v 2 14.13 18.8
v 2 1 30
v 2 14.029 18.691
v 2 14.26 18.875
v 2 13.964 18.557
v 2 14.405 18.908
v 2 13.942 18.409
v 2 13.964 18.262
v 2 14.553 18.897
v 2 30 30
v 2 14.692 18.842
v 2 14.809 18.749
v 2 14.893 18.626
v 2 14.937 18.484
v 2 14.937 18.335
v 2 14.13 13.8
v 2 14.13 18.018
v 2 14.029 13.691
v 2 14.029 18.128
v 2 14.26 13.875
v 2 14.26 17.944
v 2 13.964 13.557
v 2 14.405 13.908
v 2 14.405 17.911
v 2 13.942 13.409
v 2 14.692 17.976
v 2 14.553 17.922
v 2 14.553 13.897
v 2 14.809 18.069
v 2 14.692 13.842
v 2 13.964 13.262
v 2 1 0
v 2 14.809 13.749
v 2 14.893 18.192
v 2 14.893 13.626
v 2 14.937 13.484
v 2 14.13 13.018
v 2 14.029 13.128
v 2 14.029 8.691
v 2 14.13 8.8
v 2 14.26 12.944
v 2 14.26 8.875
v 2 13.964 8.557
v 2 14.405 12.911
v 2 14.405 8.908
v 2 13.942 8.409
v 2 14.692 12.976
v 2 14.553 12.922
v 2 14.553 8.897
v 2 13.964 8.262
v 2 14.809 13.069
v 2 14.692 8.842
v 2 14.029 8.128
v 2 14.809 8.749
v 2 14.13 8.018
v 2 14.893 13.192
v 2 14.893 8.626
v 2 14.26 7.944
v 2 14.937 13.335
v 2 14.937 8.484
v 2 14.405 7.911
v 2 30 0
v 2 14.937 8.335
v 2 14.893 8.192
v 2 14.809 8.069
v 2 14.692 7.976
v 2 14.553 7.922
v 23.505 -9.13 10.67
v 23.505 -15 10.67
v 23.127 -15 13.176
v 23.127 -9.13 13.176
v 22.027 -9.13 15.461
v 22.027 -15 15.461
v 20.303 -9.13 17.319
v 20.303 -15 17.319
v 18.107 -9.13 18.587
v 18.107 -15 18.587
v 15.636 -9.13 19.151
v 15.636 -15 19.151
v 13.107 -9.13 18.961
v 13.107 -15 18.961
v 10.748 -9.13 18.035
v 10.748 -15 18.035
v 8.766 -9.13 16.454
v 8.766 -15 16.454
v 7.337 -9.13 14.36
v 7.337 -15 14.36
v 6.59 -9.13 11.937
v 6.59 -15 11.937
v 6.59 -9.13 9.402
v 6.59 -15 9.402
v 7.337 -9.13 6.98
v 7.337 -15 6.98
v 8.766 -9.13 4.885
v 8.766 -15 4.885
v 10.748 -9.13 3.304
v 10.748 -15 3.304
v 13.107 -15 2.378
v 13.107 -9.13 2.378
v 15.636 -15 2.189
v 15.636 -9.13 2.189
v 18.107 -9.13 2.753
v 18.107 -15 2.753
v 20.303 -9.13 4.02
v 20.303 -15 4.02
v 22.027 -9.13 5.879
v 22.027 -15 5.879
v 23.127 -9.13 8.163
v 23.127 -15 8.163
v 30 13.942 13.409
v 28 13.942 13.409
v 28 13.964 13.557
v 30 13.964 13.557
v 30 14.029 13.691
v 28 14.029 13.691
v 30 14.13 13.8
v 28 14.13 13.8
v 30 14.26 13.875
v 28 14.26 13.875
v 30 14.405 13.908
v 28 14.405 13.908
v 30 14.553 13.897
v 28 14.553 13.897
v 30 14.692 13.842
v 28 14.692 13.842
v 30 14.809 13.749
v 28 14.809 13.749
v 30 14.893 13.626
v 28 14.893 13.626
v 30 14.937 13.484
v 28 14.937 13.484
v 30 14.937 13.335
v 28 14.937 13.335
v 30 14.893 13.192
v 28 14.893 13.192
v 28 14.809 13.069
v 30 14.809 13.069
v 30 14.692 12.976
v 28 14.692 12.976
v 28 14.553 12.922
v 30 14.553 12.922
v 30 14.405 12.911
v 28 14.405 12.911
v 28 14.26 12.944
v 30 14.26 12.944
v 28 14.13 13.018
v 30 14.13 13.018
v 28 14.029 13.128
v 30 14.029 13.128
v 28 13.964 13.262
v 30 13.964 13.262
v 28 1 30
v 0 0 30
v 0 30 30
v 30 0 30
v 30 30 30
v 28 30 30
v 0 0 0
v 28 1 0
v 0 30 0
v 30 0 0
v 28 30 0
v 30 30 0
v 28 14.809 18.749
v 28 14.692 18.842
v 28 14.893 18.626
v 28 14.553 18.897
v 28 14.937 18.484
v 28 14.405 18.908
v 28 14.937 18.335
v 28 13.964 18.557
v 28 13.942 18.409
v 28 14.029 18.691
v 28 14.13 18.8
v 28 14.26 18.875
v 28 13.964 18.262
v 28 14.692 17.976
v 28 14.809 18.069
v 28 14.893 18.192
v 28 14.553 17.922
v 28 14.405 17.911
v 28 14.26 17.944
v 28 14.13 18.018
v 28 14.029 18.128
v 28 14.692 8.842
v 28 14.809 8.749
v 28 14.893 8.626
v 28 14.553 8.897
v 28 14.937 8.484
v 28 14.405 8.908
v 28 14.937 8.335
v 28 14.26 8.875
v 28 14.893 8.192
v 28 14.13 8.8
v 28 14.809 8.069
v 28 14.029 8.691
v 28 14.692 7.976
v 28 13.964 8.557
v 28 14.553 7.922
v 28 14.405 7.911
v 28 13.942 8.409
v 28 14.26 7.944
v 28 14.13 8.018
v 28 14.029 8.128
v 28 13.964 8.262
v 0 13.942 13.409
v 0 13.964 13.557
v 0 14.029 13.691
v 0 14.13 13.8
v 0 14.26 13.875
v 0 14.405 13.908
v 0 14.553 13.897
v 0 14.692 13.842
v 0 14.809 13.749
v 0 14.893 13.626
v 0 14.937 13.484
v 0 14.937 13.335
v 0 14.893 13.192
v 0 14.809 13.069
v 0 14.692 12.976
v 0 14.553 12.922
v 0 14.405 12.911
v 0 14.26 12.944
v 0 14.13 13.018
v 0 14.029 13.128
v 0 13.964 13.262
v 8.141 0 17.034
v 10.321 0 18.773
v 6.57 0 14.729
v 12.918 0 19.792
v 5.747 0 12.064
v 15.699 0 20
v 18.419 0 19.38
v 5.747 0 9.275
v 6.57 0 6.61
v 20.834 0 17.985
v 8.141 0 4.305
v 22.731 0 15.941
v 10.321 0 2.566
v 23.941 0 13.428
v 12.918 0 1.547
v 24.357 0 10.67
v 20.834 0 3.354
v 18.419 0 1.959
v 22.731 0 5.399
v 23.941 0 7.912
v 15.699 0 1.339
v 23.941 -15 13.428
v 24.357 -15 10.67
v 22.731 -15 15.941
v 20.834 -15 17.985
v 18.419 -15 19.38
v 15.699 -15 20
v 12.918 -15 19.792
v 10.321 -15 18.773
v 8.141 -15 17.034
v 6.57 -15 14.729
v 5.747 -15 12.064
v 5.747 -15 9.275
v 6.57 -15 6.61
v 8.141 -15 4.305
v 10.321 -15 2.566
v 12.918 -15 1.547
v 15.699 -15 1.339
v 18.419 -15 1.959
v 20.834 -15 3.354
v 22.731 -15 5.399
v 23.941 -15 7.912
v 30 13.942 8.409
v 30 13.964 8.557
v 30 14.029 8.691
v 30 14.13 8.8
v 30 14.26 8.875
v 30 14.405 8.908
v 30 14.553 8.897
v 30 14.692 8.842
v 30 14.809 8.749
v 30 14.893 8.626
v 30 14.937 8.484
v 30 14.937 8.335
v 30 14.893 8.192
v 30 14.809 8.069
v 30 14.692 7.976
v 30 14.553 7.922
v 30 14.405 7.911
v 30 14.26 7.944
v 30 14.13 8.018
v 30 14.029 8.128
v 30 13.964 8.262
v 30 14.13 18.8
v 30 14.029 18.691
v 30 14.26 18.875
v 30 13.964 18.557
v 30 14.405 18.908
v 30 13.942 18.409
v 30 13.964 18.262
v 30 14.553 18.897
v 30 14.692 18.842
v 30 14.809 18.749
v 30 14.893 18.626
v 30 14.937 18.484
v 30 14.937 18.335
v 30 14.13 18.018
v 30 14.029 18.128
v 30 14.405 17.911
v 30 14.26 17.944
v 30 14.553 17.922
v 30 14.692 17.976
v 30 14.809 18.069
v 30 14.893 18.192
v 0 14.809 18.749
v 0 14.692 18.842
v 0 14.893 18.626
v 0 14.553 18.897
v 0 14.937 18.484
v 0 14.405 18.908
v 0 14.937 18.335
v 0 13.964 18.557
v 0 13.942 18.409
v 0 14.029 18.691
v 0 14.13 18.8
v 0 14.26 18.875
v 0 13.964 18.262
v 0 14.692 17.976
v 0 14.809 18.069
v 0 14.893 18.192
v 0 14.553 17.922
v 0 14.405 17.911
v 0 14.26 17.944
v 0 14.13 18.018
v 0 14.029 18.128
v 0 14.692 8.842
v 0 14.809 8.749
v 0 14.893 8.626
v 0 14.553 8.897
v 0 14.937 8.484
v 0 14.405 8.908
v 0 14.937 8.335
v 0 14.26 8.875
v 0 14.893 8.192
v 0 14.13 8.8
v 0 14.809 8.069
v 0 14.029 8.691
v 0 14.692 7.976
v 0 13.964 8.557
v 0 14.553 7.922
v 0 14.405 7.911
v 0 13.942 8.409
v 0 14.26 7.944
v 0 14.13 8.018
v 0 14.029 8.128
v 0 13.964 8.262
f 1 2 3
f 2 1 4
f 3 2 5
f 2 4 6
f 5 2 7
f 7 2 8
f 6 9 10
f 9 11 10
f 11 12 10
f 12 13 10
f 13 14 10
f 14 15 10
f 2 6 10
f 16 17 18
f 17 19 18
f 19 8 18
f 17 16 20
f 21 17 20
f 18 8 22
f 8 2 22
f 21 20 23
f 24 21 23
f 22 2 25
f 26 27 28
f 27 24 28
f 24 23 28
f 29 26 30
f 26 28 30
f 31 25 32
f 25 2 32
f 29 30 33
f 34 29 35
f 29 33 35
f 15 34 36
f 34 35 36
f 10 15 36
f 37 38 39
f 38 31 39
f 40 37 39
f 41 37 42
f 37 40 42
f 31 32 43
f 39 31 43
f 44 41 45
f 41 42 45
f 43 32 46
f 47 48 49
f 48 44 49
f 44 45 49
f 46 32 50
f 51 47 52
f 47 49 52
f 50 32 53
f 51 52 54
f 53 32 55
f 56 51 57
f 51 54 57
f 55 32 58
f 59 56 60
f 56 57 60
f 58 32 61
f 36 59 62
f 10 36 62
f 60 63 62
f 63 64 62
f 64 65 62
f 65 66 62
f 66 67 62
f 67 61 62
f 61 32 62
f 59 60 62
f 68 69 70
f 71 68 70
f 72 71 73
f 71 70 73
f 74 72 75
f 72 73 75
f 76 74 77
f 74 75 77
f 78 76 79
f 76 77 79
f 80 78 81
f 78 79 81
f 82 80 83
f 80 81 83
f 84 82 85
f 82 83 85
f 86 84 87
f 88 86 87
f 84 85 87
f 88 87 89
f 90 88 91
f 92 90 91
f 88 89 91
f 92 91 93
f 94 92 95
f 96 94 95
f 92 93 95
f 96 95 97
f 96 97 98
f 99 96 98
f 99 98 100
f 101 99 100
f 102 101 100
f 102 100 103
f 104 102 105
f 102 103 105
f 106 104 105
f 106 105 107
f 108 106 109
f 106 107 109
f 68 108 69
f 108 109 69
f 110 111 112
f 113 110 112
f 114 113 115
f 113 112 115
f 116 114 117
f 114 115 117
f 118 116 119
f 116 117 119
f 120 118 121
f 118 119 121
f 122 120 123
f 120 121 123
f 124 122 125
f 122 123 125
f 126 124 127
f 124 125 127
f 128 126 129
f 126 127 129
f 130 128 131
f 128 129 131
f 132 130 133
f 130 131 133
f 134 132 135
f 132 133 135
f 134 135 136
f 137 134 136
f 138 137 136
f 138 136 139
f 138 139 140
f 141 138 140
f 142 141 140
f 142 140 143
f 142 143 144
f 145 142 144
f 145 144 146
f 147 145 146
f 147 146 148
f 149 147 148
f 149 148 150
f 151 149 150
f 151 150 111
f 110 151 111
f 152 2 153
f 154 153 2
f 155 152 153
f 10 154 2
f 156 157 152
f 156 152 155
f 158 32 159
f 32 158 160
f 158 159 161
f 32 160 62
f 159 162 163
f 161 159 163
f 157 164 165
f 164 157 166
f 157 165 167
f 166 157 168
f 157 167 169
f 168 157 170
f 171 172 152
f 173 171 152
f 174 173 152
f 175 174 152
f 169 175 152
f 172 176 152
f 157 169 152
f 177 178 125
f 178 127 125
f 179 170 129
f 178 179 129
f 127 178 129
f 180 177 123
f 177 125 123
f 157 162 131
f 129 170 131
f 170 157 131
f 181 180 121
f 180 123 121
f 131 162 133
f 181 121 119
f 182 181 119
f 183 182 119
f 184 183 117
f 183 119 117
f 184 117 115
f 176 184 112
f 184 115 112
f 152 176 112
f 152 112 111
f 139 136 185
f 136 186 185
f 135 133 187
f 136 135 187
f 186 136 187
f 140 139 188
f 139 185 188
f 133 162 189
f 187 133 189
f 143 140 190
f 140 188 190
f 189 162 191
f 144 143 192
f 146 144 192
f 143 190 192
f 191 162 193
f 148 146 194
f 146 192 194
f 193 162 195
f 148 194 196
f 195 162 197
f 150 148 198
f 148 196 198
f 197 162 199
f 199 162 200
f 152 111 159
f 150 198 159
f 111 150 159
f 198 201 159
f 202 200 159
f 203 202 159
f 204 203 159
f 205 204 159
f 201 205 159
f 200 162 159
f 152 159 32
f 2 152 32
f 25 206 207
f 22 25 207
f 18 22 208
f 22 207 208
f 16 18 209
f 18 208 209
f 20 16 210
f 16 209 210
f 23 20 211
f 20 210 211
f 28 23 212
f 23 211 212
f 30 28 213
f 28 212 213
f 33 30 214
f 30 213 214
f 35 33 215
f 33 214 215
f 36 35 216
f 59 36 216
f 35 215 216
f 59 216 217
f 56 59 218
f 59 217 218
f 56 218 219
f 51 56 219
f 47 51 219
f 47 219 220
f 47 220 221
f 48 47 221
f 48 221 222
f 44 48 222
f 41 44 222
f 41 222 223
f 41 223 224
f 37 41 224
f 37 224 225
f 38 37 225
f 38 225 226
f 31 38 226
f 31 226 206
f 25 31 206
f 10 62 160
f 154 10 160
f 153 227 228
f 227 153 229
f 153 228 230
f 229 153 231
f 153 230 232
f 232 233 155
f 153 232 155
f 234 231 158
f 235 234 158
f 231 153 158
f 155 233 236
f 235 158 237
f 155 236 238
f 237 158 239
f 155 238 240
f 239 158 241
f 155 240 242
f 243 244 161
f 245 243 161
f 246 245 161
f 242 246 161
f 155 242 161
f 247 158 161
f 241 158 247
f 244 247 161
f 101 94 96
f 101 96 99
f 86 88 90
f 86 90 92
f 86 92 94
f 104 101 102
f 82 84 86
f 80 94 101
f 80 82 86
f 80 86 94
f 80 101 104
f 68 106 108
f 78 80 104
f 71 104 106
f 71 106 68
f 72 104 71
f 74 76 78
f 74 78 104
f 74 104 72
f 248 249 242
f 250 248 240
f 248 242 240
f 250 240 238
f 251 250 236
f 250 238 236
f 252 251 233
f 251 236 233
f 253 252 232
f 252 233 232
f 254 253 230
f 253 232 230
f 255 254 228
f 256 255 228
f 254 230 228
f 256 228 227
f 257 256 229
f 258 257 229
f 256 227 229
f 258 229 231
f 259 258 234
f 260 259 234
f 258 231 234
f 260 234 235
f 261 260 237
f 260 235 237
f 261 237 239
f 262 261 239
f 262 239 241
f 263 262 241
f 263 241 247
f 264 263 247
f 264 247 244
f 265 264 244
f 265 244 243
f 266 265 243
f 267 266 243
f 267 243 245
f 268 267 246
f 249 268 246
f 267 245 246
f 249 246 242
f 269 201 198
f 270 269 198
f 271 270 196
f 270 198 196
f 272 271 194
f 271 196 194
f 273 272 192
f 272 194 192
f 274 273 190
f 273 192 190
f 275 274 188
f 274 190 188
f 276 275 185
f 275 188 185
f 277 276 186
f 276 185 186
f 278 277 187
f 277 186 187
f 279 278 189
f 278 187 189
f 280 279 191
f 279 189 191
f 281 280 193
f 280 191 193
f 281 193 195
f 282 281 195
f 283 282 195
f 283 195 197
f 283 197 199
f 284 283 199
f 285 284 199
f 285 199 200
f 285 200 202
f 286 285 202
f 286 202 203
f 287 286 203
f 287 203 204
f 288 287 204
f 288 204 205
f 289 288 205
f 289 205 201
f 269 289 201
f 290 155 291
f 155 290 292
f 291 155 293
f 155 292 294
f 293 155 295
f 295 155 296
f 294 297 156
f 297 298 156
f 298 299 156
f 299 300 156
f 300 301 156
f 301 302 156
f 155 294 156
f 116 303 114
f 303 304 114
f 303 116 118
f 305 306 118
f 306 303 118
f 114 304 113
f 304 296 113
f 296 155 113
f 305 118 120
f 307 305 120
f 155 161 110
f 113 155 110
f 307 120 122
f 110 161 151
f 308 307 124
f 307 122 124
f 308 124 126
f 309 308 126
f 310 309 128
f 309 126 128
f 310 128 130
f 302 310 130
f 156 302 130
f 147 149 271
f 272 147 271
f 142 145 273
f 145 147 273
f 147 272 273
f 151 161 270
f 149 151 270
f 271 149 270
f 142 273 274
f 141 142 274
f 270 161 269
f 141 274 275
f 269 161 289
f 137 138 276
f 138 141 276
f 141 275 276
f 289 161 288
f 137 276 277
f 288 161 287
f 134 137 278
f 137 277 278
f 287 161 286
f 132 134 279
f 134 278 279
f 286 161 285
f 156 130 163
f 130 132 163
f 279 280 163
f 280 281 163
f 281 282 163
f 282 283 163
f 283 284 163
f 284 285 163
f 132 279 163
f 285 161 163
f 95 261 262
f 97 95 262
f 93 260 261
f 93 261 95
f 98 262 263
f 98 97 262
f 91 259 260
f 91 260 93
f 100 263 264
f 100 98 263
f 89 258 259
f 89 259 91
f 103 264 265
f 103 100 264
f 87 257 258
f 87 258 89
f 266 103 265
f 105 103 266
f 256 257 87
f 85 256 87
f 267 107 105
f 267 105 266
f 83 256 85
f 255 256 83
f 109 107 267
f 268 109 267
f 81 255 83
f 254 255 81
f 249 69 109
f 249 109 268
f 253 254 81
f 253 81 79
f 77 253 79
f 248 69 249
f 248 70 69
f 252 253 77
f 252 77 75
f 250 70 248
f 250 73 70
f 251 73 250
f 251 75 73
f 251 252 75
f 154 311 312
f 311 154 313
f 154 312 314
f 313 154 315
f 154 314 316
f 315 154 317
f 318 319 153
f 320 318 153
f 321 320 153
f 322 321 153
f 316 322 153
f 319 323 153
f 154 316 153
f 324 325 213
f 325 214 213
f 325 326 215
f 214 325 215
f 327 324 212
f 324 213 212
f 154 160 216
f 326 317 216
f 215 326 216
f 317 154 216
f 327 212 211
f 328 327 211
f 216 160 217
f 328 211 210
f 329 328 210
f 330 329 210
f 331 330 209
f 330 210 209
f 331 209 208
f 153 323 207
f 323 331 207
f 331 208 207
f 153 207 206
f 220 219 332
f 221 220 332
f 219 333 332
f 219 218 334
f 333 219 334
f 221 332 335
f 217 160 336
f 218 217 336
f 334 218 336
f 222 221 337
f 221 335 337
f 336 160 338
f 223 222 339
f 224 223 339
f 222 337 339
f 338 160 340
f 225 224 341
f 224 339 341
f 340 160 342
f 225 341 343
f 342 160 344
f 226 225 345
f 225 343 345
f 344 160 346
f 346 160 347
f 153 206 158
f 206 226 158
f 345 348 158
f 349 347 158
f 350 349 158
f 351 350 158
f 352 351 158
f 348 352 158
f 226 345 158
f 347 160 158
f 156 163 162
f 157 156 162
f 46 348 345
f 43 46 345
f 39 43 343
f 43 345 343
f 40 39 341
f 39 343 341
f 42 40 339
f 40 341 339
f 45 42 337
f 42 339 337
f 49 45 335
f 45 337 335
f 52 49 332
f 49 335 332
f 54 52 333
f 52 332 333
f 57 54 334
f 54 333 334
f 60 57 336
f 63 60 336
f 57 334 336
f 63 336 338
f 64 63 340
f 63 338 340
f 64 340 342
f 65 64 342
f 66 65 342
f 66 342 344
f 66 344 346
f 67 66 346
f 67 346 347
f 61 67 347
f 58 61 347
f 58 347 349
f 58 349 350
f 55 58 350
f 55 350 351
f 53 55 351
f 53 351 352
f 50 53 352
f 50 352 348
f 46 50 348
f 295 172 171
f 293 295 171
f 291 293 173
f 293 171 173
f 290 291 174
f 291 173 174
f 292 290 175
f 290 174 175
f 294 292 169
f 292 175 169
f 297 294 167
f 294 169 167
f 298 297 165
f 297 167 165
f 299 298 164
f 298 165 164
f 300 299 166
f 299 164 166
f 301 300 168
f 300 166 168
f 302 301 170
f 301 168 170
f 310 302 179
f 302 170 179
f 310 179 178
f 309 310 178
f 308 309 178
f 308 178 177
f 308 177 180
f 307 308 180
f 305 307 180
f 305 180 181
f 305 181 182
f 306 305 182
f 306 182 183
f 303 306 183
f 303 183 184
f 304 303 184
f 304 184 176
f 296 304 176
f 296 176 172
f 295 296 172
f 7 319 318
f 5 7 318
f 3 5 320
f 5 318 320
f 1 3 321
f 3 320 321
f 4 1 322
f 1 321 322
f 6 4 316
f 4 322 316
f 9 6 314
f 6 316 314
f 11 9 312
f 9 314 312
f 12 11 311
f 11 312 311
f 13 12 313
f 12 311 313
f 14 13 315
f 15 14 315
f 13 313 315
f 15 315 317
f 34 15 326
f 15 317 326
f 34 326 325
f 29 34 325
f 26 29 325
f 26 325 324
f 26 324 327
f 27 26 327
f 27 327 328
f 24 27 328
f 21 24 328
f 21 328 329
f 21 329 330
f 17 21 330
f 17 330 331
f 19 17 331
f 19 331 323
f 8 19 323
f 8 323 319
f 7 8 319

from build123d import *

# Parameters (mm, degrees)
BOSS_EXTRUDE2_DEPTH = 30
SKETCH2_R           = 9.357027653
BOSS_EXTRUDE3_DEPTH = 15
SKETCH3_R           = 8.504853576
CUT_EXTRUDE1_DEPTH  = 5.87
SKETCH4_R           = 0.5
CUT_EXTRUDE2_DEPTH  = 37.592


with BuildPart() as part:
    # Sketch1 → Boss-Extrude2 (new body)
    with BuildSketch(Plane.XY):
        Polygon((0, 30), (0, 0), (30, 0), (30, 30), (28, 30), (28, 1), (1.999996, 1), (1.999996, 30), align=None)
    extrude(amount=BOSS_EXTRUDE2_DEPTH)

    # Sketch2 → Boss-Extrude3 (add)
    with BuildSketch(Plane.XZ):
        with Locations((15, 10.669629744)):
            Circle(SKETCH2_R)
    extrude(amount=BOSS_EXTRUDE3_DEPTH)

    # Sketch3 → Cut-Extrude1 (cut)
    with BuildSketch(Plane.XZ.offset(15)):
        with Locations((15, 10.669629744)):
            Circle(SKETCH3_R)
    extrude(amount=-CUT_EXTRUDE1_DEPTH, mode=Mode.SUBTRACT)

    # Sketch4 → Cut-Extrude2 (cut)
    with BuildSketch(Plane.ZY):
        with Locations(Location((8.409330375, 14.442206742, 0), (0, 0, 270))):
            Circle(SKETCH4_R)
        with Locations(Location((13.409330375, 14.442206742, 0), (0, 0, 270))):
            Circle(SKETCH4_R)
        with Locations(Location((18.409330375, 14.442206742, 0), (0, 0, 270))):
            Circle(SKETCH4_R)
    extrude(amount=-CUT_EXTRUDE2_DEPTH, mode=Mode.SUBTRACT)


solid = part.part
